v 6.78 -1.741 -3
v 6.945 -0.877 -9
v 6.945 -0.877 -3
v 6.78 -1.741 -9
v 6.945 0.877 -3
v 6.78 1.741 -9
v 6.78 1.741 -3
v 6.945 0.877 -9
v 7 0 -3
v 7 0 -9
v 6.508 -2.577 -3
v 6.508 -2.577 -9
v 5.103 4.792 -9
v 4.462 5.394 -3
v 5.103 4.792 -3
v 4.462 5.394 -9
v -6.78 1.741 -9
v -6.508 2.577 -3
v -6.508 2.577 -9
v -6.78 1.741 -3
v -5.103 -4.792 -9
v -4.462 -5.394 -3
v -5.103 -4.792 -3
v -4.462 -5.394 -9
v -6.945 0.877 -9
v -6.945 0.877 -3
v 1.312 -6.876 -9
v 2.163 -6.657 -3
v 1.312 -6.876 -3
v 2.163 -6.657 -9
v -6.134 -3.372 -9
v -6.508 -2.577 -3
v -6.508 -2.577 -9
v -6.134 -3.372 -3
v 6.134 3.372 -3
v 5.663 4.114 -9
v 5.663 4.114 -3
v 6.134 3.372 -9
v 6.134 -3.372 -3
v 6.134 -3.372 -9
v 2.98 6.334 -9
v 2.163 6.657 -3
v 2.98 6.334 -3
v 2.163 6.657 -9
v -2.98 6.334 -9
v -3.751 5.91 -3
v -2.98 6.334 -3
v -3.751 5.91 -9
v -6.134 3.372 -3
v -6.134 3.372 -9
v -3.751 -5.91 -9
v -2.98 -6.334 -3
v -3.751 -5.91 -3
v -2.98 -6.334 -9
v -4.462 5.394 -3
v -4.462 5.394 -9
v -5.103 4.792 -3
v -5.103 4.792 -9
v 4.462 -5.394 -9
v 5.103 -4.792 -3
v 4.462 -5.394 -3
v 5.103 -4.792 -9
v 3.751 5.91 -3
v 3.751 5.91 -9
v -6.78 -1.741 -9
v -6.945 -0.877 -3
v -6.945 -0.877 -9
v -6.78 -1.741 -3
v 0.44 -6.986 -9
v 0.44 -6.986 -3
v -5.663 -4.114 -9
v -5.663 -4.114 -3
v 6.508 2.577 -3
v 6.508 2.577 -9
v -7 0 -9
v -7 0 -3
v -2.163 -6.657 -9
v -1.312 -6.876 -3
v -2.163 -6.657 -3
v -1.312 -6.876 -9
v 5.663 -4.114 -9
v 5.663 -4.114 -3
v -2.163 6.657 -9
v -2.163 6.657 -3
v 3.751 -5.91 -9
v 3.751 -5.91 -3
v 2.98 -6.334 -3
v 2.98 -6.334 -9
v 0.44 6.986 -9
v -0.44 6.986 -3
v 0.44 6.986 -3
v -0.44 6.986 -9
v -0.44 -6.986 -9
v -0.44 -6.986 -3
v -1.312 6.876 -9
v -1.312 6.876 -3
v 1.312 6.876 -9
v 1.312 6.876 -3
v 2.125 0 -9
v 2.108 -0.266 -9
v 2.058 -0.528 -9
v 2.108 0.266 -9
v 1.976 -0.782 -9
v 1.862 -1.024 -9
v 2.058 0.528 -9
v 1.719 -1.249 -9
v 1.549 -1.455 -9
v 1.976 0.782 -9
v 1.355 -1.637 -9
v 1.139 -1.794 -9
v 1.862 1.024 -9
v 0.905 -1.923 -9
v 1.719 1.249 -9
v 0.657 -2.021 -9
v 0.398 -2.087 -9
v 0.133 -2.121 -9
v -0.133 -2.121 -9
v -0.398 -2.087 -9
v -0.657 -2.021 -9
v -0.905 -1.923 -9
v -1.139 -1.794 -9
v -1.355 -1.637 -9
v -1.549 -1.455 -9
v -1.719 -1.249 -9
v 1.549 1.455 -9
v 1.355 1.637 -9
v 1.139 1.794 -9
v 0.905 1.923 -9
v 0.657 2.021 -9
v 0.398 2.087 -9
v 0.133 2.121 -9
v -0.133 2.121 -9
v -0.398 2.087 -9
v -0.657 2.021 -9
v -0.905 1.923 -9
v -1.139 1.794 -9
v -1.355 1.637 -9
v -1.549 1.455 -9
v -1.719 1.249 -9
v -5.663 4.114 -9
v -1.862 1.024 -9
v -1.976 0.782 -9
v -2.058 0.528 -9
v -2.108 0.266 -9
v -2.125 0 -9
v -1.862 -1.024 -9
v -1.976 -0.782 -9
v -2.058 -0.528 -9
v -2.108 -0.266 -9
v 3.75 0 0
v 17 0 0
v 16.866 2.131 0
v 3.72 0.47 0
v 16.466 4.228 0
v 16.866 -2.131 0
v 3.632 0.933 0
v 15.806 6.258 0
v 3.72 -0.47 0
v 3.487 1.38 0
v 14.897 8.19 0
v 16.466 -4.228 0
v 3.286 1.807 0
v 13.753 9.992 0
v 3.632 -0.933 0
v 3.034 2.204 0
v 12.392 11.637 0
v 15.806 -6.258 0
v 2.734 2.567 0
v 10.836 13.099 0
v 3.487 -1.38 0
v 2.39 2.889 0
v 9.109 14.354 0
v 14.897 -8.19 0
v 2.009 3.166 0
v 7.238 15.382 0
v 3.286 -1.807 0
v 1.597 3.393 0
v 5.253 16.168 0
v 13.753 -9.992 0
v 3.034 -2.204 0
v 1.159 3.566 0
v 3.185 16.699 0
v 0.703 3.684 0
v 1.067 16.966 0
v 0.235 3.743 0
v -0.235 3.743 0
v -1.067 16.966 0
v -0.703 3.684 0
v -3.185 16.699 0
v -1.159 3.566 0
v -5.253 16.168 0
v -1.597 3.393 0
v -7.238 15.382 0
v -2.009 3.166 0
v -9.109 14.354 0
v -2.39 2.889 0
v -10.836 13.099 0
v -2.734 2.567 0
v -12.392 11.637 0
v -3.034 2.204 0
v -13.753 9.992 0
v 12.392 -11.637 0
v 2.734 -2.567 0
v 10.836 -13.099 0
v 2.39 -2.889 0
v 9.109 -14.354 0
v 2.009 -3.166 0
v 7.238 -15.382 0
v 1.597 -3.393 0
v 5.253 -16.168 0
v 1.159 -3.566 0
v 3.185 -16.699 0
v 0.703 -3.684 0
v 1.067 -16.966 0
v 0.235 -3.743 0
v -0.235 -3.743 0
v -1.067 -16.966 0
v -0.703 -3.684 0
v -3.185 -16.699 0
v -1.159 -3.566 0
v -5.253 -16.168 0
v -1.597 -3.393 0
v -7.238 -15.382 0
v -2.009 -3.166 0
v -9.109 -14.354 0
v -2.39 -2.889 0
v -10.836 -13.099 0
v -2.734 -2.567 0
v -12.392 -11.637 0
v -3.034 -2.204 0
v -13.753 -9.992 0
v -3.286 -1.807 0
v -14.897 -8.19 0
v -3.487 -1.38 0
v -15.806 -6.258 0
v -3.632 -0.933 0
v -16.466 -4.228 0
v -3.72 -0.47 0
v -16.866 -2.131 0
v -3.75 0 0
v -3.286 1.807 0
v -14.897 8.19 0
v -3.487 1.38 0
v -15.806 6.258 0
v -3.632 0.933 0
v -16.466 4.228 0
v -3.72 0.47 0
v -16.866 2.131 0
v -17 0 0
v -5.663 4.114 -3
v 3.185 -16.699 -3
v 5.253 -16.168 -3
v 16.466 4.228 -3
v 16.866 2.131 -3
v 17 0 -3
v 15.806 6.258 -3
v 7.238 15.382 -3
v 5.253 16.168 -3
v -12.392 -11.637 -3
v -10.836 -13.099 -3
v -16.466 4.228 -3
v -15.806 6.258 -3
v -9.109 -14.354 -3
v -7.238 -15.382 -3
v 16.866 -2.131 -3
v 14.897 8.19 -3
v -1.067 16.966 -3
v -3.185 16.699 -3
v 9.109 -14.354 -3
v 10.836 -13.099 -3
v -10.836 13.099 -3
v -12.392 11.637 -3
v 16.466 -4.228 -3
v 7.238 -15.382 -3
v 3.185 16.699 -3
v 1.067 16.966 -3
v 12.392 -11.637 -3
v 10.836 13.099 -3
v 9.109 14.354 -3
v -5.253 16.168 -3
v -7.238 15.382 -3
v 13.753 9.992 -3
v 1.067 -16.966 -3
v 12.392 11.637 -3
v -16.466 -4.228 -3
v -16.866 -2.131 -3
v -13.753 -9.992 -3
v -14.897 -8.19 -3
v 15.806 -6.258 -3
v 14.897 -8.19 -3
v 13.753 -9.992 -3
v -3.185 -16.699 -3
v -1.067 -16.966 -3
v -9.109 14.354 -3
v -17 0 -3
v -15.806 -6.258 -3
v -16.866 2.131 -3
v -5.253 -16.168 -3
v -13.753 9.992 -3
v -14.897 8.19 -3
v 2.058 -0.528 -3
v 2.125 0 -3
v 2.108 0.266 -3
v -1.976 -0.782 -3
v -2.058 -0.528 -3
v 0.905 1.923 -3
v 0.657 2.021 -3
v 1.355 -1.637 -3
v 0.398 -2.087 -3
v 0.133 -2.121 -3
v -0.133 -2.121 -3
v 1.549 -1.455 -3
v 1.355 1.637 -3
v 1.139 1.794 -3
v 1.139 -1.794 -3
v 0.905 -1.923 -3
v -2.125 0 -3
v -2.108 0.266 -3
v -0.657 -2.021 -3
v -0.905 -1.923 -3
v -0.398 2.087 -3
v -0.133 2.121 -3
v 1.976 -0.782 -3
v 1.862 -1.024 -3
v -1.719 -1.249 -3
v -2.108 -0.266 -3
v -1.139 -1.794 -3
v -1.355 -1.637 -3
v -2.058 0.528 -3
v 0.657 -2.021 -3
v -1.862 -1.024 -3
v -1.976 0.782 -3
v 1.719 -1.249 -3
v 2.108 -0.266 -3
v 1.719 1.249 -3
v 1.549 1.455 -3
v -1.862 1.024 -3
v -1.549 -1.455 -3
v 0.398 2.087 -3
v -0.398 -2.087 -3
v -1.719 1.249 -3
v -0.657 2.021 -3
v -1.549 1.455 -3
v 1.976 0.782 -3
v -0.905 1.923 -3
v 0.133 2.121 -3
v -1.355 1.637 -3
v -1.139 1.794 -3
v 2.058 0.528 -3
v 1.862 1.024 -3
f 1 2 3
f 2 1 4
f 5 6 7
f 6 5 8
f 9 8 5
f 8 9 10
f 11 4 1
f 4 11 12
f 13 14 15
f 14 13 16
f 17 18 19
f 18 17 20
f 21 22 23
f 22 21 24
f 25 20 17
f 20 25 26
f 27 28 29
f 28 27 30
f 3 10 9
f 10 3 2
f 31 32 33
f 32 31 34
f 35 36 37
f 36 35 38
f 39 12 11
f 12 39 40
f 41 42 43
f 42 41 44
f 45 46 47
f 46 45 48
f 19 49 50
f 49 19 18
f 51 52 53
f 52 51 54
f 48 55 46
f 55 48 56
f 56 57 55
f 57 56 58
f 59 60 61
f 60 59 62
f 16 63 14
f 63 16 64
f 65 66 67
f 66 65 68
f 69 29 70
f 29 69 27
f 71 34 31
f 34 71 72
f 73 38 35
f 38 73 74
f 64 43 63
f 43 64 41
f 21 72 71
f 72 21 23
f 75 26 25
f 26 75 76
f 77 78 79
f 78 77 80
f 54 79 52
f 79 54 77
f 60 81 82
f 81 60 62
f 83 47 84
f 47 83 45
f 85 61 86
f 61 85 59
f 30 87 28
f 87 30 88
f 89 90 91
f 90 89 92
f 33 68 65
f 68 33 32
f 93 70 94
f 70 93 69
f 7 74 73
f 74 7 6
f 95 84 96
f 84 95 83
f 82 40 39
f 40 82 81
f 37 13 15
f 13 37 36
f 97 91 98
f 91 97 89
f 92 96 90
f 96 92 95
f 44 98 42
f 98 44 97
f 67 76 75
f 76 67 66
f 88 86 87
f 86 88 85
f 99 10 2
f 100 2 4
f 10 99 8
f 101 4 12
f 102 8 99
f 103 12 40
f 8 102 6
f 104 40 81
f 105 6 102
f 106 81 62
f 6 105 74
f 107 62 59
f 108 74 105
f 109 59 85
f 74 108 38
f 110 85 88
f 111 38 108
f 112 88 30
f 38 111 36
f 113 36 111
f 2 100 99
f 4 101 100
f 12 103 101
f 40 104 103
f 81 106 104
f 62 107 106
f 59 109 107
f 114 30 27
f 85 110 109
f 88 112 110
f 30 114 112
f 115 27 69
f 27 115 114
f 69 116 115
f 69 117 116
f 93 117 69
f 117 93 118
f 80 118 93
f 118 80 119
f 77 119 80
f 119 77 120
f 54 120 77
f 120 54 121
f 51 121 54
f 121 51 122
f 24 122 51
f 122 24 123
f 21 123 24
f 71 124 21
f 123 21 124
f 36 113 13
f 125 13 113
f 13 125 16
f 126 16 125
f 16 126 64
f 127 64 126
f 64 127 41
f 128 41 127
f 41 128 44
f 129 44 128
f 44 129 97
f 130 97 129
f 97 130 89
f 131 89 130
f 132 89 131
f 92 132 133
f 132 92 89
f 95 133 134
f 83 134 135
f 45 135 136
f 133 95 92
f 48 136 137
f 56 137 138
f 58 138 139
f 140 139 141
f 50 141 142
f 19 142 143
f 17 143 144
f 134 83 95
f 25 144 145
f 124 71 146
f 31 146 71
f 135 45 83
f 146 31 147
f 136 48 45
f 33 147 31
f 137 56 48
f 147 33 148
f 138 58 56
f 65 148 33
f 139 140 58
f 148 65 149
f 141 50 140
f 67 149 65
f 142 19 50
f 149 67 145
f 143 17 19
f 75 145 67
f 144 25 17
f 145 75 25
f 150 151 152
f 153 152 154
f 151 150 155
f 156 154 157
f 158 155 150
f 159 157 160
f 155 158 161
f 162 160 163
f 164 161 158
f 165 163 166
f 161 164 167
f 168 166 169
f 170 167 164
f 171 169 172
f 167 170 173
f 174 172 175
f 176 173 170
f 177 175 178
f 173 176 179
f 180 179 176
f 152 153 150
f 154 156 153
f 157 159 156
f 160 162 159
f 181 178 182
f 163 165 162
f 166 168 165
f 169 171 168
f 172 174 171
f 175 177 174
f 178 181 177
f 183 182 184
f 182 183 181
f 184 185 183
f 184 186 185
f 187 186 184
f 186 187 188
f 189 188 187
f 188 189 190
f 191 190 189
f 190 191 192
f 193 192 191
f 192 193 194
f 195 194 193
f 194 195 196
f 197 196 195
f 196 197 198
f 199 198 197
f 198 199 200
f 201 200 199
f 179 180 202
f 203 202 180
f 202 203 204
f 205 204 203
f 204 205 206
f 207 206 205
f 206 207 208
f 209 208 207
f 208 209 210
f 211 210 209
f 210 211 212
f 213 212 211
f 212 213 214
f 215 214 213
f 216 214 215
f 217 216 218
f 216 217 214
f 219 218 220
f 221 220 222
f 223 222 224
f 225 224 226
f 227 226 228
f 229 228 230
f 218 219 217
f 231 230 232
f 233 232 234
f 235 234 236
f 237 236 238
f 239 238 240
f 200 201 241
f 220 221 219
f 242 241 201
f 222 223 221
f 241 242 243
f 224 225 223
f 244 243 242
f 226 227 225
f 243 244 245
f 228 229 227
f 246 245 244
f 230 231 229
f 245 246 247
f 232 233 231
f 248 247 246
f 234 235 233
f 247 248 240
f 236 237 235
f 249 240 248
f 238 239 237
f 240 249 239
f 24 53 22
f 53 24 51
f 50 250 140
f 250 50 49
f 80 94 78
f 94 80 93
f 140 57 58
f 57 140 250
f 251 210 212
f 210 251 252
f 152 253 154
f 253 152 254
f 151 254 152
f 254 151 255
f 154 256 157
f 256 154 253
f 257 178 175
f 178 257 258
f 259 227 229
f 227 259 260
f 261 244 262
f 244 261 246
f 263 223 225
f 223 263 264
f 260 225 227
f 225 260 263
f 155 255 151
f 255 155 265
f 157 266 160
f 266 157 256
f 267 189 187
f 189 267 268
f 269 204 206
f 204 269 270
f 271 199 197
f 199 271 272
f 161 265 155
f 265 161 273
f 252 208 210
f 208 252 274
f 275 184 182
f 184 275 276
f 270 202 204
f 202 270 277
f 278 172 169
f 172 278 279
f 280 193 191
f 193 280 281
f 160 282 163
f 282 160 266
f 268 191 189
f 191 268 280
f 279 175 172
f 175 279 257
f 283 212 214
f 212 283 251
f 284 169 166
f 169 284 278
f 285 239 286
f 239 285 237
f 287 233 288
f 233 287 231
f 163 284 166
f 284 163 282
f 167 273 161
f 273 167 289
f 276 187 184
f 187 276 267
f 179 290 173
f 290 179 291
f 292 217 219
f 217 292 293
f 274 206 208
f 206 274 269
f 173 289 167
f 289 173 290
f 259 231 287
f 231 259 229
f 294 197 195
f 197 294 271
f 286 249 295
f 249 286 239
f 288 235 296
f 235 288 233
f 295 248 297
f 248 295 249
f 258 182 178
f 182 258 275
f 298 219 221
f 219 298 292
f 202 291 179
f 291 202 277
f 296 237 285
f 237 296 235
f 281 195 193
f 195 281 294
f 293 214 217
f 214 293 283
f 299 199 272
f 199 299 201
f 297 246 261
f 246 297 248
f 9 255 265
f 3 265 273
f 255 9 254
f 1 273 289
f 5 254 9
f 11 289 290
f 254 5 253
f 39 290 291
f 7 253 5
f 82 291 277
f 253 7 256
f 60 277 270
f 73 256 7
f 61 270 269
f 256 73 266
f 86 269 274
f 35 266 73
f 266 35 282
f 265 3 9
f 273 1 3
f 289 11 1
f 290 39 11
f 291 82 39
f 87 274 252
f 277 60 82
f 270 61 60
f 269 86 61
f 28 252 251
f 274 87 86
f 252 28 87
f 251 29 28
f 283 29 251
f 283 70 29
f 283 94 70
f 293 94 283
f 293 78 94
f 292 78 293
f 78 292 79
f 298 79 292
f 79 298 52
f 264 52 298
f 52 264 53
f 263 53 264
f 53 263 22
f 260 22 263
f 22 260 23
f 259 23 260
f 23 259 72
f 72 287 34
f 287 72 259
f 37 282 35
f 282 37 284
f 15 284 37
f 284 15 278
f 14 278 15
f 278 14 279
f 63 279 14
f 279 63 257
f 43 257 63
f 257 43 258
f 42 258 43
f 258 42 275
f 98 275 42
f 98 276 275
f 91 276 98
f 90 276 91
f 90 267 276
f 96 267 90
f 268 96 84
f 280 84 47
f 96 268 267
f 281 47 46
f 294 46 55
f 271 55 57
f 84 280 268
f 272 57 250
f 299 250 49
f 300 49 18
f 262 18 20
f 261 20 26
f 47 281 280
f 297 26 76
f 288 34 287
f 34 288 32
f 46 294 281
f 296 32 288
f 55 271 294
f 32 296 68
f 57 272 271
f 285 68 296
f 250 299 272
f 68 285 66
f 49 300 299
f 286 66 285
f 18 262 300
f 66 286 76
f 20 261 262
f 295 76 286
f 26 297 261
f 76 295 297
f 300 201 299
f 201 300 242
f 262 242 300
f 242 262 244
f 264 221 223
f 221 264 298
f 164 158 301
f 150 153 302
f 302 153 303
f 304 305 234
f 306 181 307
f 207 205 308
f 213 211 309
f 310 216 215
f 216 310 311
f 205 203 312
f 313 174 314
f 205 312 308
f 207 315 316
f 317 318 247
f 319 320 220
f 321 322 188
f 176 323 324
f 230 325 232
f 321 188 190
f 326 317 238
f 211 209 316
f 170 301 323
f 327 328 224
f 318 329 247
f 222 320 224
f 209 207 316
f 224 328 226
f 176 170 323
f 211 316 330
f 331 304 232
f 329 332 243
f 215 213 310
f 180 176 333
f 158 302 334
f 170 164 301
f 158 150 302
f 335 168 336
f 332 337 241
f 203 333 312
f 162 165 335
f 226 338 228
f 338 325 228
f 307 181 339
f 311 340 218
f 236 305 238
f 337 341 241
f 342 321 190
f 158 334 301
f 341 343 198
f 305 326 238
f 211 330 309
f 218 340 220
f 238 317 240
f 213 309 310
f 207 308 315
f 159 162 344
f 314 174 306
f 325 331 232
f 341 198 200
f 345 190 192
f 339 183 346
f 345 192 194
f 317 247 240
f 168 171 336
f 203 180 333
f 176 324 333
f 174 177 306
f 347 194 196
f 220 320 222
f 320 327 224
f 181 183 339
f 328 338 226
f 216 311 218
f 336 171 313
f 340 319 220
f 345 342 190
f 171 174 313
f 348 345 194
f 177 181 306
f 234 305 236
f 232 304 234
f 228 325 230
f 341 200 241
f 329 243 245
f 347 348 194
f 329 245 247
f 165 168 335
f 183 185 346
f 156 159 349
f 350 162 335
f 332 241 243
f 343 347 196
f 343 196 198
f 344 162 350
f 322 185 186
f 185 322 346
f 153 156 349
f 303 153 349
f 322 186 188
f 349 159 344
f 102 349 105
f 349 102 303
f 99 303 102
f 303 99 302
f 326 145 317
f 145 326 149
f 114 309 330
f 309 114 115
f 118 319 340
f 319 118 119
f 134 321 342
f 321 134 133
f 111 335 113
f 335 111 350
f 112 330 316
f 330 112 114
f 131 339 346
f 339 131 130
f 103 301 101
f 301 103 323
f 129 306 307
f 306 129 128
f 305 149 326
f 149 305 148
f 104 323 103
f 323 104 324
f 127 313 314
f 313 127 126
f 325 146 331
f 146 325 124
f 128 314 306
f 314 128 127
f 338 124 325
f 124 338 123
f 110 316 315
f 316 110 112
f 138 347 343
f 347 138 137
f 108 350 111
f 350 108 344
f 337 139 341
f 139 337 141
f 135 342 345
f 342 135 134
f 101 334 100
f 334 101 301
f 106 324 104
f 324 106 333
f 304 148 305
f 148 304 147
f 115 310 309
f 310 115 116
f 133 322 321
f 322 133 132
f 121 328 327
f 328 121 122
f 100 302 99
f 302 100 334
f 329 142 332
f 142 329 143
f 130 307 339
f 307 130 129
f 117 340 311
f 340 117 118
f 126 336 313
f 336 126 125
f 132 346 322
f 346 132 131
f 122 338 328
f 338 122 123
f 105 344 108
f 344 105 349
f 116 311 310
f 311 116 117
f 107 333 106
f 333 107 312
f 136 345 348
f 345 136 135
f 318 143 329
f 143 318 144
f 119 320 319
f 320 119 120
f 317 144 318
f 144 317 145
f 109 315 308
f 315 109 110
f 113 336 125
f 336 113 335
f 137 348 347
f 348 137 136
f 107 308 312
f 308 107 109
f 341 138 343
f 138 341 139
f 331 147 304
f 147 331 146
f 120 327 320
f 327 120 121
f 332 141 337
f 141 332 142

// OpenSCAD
$fn = 50;


difference() {
	union() {
		translate(v = [0, 0, -9.0000000000]) {
			cylinder(h = 9, r = 7.0000000000);
		}
		translate(v = [0, 0, -3.0000000000]) {
			cylinder(h = 3, r = 17.0000000000);
		}
	}
	union() {
		translate(v = [0, 0, 0]) {
			rotate(a = [0, 0, 0]) {
				difference() {
					union() {
						#translate(v = [0, 0, -9.0000000000]) {
							cylinder(h = 9, r = 2.0000000000);
						}
						#translate(v = [0, 0, -3]) {
							cylinder(h = 3, r = 7.0000000000, r1 = 2.1250000000, r2 = 3.7500000000);
						}
						#translate(v = [0, 0, -9.0000000000]) {
							cylinder(h = 9, r = 2.1250000000);
						}
						#translate(v = [0, 0, -9.0000000000]) {
							cylinder(h = 9, r = 2.0000000000);
						}
					}
					union();
				}
			}
		}
	}
}
